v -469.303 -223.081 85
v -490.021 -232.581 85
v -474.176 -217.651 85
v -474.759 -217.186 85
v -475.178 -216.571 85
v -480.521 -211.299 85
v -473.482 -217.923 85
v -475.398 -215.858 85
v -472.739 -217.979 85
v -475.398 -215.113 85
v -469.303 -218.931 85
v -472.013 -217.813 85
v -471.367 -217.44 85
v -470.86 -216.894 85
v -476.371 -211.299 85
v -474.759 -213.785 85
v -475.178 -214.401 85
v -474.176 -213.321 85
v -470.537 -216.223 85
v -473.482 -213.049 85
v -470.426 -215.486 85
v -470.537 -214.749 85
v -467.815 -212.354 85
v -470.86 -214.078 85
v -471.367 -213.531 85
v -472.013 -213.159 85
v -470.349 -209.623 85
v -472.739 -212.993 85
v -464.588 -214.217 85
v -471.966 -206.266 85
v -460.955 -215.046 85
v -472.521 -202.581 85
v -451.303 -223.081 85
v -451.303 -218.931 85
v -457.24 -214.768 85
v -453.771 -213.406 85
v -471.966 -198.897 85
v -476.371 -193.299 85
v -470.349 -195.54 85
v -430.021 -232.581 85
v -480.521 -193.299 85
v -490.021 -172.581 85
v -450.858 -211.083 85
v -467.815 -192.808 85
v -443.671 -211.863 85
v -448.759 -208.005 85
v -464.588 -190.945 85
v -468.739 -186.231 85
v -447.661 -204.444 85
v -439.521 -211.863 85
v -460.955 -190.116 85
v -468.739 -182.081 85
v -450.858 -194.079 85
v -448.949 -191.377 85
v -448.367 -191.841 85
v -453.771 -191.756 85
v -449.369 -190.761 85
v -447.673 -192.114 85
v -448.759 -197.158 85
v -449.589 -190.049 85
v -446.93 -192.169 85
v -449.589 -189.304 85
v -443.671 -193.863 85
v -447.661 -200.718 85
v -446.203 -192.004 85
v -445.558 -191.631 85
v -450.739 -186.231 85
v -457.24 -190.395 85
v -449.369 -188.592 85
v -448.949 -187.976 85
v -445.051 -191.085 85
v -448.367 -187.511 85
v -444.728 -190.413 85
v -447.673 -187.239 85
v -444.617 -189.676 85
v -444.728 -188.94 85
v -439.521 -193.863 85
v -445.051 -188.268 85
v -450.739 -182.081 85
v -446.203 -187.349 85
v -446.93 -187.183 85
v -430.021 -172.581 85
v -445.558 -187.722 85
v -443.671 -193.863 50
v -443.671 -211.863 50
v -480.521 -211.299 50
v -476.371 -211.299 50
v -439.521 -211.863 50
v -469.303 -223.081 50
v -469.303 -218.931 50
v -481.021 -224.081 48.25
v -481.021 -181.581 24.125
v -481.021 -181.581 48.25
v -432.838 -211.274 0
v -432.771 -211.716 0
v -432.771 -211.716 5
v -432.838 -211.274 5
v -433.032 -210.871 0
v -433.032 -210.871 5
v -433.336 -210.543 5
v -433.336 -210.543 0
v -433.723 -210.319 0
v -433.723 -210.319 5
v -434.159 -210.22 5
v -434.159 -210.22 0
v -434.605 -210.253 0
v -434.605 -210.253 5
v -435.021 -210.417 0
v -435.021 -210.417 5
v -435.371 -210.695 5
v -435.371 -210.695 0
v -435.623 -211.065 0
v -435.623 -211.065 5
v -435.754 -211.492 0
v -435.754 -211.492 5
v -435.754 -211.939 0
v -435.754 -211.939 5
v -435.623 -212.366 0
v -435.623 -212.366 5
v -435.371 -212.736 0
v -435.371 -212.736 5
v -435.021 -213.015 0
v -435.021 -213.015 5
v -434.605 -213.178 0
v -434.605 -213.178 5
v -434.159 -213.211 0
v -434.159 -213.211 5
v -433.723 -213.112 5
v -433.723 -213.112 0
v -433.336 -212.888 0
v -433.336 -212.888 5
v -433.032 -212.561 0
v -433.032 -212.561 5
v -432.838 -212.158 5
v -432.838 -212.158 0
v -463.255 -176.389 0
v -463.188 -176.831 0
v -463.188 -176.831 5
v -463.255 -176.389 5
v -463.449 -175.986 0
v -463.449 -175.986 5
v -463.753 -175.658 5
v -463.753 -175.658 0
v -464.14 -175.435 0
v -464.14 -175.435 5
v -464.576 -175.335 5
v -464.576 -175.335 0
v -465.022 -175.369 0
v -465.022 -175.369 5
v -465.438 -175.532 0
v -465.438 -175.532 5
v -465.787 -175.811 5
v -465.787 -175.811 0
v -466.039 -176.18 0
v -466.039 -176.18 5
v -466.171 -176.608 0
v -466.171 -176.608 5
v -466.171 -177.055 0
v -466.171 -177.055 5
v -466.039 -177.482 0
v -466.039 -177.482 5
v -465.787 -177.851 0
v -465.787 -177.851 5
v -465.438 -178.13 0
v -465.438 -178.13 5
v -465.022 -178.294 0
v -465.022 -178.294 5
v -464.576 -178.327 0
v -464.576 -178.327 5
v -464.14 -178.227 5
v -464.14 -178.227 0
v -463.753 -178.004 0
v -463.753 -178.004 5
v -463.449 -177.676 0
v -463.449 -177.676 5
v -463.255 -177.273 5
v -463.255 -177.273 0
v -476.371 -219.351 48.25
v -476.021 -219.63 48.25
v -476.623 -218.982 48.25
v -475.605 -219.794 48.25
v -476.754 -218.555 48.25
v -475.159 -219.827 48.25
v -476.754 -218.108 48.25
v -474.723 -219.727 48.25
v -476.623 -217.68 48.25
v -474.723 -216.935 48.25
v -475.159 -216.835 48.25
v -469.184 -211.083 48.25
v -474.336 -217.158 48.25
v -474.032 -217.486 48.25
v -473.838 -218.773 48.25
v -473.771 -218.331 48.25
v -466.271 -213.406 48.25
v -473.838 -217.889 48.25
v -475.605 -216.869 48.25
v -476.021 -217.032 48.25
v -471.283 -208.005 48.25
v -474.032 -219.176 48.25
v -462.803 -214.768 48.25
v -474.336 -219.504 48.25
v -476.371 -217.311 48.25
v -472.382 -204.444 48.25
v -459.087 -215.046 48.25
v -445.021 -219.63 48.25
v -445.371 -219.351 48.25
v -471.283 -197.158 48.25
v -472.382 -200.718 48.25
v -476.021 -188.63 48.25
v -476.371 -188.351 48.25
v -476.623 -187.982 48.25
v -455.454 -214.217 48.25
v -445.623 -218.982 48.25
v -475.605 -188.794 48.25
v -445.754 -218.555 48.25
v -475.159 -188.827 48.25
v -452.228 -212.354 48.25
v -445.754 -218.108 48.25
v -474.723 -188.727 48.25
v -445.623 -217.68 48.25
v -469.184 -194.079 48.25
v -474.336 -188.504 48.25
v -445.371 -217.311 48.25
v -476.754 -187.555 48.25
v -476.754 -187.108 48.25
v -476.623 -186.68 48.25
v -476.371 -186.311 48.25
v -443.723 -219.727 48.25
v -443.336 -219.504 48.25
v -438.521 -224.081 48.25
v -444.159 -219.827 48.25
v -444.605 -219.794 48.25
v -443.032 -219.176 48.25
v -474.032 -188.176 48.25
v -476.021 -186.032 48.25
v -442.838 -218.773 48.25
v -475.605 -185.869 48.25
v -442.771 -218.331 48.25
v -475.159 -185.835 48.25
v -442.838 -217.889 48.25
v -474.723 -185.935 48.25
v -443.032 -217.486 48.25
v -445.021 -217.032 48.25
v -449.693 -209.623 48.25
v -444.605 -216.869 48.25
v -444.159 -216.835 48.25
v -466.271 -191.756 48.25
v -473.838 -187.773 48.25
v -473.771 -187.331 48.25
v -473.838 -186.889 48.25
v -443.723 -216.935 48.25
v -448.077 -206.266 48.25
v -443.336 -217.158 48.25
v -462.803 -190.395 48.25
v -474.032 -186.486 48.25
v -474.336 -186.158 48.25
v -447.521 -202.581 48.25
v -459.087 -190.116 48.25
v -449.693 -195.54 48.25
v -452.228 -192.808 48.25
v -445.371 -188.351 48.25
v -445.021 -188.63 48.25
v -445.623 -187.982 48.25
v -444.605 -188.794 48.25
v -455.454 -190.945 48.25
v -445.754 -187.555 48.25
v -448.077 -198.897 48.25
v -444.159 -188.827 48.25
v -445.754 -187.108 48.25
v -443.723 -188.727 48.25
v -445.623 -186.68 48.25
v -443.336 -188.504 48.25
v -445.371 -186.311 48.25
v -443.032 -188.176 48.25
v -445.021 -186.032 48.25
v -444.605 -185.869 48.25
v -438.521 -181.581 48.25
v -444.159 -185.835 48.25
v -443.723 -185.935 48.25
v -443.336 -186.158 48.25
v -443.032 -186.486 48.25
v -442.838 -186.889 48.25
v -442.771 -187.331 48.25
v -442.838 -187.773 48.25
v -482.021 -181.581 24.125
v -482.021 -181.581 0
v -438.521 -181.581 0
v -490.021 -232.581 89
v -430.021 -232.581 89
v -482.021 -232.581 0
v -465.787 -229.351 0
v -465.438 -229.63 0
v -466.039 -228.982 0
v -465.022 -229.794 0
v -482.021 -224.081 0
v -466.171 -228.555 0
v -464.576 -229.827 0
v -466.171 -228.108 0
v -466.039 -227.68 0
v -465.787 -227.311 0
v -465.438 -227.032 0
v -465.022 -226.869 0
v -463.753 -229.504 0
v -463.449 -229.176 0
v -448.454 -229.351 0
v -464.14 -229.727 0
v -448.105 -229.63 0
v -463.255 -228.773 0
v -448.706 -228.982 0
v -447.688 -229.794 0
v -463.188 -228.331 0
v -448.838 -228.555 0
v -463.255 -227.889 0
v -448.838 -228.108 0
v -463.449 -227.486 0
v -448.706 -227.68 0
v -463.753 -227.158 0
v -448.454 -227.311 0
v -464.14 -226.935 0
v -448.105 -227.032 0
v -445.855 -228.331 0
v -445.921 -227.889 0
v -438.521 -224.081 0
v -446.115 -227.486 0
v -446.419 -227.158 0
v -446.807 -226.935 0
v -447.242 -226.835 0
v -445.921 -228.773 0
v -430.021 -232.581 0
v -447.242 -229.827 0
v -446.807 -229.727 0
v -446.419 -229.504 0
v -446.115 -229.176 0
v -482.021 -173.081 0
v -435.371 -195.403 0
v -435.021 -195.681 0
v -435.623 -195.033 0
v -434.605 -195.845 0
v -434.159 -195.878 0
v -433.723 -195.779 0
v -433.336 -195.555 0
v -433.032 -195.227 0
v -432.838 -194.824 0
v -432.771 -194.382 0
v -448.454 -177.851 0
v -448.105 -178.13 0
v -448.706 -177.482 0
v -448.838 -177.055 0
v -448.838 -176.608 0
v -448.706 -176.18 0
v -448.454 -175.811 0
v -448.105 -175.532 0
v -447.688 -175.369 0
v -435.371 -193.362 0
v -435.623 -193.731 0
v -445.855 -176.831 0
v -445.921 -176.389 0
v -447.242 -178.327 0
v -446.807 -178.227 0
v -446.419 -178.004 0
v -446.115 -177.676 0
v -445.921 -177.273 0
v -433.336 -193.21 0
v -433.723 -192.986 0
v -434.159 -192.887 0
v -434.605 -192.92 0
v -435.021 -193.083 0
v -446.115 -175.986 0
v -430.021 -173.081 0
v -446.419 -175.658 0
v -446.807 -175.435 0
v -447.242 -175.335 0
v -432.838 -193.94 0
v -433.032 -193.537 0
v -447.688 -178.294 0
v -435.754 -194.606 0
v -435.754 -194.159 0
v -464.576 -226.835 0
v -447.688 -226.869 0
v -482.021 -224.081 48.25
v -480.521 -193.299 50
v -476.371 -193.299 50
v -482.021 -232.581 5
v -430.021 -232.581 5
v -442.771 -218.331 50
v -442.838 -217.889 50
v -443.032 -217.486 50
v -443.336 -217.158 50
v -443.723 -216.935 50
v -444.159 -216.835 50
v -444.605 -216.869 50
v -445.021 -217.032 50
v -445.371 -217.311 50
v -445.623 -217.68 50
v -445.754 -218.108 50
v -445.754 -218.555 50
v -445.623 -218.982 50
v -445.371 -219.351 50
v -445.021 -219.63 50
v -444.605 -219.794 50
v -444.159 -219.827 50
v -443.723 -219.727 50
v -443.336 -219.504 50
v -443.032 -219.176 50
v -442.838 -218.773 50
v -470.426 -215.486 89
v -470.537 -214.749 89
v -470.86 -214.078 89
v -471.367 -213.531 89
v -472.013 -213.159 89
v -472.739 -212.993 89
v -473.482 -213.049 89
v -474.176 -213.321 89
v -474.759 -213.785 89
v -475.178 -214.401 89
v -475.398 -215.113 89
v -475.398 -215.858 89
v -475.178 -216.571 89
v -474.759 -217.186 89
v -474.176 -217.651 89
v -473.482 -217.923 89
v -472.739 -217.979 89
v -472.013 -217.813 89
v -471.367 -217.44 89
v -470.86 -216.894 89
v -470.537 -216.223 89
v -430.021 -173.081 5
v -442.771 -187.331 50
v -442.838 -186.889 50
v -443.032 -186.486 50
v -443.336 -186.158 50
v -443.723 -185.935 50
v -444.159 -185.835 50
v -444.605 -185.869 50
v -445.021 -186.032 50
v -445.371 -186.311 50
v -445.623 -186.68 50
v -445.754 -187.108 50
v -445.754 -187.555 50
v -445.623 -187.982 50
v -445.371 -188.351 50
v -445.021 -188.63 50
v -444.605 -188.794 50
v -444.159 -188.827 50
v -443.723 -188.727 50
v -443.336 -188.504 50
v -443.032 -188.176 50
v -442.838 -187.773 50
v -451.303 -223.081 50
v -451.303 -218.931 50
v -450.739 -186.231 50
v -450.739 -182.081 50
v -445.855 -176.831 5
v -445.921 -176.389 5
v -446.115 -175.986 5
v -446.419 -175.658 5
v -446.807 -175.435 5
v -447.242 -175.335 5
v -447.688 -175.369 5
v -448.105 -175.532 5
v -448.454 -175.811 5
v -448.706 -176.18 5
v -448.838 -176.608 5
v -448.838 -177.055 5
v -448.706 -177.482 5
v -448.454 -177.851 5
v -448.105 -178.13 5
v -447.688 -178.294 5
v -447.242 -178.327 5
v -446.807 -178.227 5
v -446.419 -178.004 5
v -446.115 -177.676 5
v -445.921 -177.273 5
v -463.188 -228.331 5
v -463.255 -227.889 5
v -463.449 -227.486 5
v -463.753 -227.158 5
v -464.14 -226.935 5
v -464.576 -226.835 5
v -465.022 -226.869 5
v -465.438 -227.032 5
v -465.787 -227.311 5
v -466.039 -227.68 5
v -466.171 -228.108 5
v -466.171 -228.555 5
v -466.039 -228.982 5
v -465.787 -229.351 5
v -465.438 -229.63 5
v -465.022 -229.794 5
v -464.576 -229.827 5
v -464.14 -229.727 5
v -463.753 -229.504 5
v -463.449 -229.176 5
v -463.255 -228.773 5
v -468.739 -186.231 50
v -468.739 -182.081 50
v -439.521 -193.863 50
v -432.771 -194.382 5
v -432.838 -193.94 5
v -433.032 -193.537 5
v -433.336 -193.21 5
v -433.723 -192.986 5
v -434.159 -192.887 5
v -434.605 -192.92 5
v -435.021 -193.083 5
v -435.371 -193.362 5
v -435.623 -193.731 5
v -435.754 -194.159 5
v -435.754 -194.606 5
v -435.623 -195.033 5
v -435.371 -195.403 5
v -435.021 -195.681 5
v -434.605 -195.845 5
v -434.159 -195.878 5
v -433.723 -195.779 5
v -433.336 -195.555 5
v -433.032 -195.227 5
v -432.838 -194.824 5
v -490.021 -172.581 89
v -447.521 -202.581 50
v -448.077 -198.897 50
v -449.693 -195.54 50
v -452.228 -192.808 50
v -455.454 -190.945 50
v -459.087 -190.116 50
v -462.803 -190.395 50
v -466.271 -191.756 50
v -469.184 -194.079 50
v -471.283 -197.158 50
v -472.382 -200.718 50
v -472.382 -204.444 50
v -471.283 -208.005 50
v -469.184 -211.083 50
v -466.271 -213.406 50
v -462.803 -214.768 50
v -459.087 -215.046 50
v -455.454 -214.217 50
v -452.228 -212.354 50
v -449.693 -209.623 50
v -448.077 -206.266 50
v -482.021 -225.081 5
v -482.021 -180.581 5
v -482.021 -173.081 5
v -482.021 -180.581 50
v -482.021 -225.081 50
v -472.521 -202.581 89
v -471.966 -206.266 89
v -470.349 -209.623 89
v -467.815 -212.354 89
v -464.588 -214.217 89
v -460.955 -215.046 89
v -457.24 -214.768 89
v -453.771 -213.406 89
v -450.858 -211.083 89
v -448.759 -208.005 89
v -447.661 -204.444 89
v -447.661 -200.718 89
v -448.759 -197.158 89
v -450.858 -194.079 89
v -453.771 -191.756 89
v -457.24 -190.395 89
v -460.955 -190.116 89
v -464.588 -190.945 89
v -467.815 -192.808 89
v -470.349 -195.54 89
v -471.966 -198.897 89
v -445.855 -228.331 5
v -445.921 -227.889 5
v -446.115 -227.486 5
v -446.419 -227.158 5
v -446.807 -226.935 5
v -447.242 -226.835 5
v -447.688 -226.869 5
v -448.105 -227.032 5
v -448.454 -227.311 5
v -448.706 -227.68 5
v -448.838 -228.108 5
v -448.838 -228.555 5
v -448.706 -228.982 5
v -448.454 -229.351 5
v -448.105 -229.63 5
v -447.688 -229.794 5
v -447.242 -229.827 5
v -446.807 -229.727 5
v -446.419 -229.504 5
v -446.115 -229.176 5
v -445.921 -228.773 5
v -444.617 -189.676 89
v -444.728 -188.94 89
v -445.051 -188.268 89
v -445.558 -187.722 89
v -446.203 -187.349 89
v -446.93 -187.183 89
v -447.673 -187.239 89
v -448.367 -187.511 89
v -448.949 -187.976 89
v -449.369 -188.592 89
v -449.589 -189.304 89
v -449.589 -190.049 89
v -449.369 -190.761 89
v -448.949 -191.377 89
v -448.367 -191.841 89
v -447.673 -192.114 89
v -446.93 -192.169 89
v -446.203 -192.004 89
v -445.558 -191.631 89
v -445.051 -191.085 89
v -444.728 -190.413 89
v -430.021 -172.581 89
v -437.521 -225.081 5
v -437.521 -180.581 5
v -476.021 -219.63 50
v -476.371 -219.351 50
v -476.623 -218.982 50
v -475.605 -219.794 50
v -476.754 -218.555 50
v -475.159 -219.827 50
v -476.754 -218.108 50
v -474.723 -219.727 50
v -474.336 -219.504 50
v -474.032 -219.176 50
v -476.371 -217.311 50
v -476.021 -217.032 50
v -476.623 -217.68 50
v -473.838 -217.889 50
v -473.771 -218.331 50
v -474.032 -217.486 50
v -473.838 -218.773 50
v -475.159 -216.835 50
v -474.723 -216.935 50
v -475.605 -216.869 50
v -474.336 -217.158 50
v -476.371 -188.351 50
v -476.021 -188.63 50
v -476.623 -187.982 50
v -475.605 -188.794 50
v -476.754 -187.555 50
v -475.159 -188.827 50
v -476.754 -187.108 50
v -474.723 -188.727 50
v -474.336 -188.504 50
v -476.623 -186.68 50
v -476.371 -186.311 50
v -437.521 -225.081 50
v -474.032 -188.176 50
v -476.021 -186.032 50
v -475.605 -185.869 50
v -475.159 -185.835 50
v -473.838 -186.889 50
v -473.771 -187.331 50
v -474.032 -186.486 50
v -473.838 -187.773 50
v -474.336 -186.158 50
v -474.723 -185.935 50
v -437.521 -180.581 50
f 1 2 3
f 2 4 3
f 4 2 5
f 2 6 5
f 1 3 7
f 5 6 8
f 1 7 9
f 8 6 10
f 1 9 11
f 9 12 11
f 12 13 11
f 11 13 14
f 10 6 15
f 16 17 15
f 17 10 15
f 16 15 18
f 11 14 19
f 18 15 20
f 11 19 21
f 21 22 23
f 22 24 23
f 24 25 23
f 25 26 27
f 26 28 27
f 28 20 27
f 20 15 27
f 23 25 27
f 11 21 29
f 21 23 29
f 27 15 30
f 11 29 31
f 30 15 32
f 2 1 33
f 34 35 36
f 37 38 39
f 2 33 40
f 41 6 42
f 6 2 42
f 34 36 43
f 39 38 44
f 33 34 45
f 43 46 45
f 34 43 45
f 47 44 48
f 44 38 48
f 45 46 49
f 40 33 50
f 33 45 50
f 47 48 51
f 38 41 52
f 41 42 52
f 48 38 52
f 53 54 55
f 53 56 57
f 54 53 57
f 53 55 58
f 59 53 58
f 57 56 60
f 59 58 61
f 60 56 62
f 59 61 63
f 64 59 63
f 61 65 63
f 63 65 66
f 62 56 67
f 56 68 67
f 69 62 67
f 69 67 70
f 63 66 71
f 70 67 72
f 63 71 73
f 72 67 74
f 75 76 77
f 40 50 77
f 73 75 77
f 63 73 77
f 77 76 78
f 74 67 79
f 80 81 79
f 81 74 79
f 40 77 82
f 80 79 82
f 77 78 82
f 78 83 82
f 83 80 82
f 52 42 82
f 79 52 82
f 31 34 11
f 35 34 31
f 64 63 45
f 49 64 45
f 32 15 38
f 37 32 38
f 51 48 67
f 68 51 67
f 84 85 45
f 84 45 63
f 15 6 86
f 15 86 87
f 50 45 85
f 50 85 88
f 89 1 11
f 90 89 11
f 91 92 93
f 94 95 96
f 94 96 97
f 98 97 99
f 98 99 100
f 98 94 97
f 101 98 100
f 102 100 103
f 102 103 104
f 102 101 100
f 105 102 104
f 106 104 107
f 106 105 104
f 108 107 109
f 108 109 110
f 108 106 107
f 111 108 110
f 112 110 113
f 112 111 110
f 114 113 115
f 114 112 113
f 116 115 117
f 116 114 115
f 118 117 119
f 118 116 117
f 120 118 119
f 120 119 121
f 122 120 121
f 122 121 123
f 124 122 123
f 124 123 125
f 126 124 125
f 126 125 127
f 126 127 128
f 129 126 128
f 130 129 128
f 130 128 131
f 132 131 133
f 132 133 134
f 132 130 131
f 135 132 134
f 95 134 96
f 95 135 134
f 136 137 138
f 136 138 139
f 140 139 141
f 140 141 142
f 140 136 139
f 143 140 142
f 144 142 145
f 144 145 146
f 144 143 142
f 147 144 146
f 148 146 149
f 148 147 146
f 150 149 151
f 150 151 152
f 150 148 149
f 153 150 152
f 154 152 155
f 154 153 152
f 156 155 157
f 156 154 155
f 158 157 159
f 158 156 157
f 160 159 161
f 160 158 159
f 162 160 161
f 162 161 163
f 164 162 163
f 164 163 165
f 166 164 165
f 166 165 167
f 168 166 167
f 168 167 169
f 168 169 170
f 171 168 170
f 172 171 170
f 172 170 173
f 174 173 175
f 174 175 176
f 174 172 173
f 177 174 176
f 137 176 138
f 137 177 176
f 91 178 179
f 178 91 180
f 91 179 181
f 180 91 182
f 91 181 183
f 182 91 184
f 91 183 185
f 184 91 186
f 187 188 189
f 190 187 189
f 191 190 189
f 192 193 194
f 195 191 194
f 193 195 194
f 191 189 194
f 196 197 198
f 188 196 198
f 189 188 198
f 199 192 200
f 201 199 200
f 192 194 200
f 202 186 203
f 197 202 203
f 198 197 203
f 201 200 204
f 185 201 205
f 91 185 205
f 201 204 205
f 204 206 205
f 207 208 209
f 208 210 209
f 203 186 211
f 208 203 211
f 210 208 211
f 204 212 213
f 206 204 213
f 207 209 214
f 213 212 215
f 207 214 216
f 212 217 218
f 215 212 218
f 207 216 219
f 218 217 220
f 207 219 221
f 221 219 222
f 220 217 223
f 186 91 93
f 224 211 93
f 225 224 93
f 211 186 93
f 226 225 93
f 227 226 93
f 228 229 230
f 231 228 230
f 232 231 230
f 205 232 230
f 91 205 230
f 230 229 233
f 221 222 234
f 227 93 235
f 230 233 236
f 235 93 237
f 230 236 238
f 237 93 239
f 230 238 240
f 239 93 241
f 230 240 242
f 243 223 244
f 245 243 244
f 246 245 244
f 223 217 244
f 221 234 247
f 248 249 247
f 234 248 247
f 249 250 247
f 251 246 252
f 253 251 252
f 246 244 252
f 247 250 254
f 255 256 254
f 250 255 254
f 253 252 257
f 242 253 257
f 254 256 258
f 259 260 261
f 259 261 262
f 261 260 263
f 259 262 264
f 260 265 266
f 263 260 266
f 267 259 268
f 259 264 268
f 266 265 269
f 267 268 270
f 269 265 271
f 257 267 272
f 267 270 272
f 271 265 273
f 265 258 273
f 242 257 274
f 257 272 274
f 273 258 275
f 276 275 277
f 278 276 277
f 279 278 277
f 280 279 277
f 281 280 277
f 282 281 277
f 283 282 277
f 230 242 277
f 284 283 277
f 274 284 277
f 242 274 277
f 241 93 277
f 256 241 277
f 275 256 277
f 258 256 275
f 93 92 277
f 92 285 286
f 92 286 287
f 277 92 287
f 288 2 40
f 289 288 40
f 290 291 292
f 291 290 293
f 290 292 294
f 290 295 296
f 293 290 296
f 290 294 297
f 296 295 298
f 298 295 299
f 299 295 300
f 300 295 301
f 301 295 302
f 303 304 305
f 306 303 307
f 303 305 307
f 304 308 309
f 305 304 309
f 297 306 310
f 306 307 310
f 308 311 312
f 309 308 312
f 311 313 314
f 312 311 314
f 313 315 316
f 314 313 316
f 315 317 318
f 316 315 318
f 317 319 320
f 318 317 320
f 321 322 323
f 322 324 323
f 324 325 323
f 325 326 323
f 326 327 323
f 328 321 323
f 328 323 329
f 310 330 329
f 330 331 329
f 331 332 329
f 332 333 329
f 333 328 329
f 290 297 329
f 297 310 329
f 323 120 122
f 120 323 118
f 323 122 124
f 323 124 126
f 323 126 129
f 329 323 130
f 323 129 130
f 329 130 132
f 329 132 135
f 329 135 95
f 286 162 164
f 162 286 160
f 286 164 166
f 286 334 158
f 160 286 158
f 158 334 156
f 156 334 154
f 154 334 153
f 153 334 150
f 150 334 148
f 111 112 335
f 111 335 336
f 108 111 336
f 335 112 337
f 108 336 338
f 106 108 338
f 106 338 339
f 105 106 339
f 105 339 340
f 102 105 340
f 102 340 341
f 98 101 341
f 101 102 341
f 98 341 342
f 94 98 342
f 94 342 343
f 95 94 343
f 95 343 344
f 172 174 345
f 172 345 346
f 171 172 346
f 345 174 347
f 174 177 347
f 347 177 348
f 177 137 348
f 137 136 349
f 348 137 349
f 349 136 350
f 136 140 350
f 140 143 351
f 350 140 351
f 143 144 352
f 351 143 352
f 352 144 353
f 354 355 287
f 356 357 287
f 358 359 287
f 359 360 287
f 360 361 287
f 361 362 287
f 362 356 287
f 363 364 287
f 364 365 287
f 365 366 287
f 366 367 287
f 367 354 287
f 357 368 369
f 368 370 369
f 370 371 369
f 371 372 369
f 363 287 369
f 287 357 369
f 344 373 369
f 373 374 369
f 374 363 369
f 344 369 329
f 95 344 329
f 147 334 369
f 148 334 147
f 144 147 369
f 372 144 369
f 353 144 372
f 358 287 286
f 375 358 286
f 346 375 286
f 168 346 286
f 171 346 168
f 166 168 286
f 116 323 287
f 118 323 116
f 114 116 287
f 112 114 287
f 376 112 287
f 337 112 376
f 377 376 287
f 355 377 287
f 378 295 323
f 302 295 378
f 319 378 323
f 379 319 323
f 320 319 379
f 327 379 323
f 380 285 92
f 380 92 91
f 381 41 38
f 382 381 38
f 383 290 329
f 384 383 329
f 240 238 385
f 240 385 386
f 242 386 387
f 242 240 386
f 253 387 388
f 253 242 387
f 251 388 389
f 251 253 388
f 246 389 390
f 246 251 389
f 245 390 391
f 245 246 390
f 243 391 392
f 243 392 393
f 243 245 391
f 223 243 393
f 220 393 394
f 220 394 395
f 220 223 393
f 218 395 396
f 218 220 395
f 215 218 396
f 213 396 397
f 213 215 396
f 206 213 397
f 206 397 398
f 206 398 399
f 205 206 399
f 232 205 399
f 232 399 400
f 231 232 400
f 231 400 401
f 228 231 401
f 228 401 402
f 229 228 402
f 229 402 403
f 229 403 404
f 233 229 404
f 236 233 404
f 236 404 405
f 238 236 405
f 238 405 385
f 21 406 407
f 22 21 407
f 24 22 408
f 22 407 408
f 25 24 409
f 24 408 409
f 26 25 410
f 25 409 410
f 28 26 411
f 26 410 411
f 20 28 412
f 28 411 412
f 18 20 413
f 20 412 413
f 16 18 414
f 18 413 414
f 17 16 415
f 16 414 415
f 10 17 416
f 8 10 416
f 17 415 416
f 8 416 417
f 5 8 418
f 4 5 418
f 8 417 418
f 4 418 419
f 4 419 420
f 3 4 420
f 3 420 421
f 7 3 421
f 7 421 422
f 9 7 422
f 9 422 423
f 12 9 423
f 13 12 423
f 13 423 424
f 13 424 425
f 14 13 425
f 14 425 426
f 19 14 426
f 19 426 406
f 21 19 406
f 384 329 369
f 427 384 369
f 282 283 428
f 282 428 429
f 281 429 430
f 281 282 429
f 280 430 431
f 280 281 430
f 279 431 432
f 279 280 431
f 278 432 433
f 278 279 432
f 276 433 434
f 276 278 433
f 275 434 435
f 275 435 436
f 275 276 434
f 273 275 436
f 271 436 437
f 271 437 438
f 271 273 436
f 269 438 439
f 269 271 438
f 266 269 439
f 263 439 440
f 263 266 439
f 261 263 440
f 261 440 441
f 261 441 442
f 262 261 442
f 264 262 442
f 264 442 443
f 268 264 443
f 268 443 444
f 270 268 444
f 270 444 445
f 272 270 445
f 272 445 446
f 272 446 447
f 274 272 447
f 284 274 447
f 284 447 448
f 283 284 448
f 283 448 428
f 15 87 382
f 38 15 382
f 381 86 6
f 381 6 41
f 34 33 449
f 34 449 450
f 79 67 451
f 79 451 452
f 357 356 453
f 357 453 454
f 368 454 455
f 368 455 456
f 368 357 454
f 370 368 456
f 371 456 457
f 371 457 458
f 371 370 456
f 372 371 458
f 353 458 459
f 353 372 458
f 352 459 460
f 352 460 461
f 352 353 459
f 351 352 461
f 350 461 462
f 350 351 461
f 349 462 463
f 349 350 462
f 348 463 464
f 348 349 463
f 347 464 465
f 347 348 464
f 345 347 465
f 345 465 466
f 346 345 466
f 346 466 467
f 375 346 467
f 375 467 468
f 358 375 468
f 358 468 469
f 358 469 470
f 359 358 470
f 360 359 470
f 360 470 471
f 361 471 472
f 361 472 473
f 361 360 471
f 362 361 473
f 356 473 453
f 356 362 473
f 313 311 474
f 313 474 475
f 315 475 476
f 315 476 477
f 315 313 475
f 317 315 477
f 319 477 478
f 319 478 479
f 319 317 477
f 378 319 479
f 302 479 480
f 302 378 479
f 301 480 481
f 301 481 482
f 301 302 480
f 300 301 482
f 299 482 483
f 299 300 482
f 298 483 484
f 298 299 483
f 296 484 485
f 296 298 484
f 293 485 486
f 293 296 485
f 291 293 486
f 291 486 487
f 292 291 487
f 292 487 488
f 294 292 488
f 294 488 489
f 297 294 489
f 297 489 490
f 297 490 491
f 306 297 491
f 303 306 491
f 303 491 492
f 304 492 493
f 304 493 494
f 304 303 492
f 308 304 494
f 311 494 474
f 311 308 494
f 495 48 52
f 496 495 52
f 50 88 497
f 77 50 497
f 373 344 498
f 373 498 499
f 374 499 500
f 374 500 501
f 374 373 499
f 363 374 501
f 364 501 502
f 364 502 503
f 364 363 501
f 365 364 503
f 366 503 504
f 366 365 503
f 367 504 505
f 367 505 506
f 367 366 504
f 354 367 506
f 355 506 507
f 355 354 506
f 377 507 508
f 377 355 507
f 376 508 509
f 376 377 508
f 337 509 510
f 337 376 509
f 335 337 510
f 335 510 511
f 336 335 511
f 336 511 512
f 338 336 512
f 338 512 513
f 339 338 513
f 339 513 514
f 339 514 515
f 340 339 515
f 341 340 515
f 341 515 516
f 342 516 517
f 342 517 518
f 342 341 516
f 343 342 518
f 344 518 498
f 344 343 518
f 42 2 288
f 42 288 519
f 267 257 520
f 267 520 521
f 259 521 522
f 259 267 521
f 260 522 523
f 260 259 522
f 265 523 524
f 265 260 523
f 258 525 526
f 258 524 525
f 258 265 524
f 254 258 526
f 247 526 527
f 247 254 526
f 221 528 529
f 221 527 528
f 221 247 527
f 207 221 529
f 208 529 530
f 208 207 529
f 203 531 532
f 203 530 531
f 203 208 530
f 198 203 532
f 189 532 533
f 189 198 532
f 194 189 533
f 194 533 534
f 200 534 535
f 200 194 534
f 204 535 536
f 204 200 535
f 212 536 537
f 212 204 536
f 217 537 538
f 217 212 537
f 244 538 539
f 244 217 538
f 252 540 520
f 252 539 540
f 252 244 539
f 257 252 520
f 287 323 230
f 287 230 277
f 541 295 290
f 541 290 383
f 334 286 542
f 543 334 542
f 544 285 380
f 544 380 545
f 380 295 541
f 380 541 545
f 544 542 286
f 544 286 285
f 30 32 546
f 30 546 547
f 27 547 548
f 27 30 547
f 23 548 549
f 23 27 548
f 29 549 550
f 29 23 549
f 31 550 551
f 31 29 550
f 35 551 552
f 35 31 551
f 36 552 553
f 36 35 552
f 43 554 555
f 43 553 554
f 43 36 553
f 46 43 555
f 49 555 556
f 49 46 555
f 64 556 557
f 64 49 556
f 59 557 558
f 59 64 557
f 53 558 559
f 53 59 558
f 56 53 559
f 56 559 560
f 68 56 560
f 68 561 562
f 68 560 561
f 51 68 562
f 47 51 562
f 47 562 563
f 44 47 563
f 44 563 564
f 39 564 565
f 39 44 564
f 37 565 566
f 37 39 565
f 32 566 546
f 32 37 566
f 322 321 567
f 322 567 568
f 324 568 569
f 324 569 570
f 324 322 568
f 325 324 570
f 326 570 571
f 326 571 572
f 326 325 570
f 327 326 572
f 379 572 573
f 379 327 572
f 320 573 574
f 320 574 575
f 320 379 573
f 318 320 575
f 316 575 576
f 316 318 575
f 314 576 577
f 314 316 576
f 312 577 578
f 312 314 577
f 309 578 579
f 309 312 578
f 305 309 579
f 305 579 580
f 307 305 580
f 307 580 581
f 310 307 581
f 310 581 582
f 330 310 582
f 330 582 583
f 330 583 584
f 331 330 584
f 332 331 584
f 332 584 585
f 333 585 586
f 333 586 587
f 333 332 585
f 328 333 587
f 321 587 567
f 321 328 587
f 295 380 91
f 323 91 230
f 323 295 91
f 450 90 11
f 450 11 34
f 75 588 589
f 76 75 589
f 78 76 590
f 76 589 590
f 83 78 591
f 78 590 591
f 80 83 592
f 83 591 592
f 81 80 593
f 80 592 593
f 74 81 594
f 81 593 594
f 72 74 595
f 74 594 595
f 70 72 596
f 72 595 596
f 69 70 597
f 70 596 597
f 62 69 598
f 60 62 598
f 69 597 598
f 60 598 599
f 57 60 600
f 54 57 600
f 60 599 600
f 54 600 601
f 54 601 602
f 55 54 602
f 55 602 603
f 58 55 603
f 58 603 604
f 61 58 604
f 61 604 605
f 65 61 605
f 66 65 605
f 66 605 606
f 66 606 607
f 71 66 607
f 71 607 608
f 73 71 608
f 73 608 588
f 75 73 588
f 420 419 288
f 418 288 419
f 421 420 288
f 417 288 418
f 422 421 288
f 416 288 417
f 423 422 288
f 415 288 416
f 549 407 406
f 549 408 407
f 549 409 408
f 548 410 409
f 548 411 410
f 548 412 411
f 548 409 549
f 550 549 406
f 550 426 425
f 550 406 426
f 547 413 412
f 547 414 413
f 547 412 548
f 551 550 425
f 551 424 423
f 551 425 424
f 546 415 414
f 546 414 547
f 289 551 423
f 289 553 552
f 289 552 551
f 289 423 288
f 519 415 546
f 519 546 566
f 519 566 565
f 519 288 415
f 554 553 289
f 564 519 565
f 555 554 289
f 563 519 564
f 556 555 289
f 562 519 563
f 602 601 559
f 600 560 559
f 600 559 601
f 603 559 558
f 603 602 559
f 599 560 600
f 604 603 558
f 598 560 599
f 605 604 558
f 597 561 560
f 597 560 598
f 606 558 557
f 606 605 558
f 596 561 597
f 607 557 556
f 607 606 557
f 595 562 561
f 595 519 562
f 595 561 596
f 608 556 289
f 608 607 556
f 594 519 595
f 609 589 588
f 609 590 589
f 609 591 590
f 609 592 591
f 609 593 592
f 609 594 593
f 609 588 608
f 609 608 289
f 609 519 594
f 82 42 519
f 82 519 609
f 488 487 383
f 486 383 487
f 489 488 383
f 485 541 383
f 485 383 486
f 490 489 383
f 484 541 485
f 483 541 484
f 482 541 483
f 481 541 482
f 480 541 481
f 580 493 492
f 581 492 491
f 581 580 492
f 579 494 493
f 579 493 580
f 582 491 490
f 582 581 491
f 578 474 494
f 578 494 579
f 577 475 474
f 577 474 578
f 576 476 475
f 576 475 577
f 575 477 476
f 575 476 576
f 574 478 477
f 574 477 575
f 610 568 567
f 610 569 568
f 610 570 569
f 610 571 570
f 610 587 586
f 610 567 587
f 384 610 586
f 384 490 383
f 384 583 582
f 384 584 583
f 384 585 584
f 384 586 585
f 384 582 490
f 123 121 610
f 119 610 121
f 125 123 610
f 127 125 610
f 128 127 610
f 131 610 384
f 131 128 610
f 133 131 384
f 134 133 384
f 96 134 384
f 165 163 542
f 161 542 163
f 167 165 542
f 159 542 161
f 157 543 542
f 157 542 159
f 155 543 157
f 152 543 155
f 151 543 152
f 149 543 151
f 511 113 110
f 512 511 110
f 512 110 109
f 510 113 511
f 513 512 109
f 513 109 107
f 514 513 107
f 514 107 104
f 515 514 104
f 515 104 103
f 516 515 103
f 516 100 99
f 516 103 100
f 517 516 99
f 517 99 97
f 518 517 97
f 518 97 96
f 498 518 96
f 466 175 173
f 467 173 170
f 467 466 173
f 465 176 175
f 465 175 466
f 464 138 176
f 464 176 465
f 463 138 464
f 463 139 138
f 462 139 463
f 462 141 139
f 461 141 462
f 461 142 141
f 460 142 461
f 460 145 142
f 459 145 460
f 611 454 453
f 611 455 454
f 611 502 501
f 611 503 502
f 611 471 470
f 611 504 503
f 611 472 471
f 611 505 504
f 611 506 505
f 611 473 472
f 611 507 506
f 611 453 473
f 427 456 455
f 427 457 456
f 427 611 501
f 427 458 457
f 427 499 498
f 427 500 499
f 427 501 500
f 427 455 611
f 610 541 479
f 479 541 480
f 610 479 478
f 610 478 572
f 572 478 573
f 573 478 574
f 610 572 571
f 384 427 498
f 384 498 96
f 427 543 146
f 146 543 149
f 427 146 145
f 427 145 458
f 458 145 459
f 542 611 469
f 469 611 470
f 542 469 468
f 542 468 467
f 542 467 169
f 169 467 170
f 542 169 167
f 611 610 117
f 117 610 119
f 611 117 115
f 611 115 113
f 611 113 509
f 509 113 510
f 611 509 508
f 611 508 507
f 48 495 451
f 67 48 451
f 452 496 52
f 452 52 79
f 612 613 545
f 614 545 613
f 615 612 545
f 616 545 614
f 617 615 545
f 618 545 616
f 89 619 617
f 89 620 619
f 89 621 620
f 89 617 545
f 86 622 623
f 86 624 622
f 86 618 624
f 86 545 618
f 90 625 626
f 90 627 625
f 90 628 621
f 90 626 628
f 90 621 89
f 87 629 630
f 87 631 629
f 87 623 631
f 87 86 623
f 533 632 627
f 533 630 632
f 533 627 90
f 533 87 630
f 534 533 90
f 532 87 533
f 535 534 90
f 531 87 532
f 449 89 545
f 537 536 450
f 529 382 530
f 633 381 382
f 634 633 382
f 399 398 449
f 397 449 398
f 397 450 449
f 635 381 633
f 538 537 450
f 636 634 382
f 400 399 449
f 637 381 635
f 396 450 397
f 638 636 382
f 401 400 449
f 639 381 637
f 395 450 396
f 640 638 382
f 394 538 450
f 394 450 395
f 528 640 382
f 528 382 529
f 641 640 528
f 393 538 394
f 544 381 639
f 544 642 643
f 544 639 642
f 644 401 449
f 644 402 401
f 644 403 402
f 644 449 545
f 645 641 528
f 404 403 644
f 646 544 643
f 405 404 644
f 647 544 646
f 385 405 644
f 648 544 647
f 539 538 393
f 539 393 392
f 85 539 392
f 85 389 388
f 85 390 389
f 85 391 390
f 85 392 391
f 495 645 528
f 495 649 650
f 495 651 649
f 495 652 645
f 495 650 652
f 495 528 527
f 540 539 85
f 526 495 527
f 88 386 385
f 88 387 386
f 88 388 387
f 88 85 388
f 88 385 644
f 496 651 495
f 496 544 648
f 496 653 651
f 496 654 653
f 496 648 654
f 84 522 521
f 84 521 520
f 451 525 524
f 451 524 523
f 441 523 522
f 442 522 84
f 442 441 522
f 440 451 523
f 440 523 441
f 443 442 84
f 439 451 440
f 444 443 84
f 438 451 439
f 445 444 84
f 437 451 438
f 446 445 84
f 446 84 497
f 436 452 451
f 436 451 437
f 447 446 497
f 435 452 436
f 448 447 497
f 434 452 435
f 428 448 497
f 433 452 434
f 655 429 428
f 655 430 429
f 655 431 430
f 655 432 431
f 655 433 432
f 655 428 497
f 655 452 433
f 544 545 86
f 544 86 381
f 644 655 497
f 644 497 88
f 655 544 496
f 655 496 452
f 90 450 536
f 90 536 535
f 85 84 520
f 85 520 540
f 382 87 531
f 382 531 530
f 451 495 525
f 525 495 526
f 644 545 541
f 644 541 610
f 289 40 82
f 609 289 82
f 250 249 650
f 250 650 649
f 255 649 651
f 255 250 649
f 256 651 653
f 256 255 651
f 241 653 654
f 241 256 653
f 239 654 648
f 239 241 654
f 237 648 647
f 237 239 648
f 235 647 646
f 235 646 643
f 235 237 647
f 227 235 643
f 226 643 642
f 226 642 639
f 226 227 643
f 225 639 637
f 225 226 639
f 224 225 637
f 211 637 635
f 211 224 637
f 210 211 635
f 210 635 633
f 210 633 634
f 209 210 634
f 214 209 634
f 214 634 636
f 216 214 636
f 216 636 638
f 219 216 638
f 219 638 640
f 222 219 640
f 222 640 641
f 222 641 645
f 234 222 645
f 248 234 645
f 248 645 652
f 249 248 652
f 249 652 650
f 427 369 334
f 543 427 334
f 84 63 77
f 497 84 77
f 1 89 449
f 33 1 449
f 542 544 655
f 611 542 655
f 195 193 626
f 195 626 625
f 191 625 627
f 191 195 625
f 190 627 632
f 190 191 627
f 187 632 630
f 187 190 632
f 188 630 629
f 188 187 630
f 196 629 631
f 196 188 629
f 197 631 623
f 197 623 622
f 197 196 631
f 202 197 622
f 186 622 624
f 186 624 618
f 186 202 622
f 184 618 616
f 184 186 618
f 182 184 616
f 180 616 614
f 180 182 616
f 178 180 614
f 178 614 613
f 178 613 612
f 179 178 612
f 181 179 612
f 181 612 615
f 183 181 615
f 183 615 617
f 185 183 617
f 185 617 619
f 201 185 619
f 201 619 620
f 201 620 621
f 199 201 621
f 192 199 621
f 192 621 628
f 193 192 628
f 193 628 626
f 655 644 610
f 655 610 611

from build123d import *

# Parameters (mm, degrees)
SKETCH6_R           = 1.5
BOSS_EXTRUDE4_DEPTH = 5
SKETCH8_W           = 44.5
SKETCH8_H           = 44.5
SKETCH8_R           = 1.5
SKETCH8_R_2         = 12.5
BOSS_EXTRUDE5_DEPTH = 50
SKETCH7_W           = 43.5
SKETCH7_H           = 42.5
CUT_EXTRUDE4_DEPTH  = 48.25
BOSS_EXTRUDE6_DEPTH = 1
SKETCH11_W          = 18
SKETCH11_H          = 4.15
SKETCH11_W_2        = 4.15
SKETCH11_H_2        = 18
BOSS_EXTRUDE7_DEPTH = 35
SKETCH14_W          = 60
SKETCH14_H          = 60
BOSS_EXTRUDE8_DEPTH = 4
CUT_EXTRUDE5_REACH  = 551.669
SKETCH16_R          = 2.5
SKETCH17_R          = 12.5
CUT_EXTRUDE6_DEPTH  = 550.668785806


with BuildPart() as part:
    # Sketch6 → Boss-Extrude4 (new body)
    with BuildSketch(Plane.XY):
        Polygon((-437.521213625, -225.081134847), (-482.021213625, -225.081134847), (-482.021213625, -232.581134847), (-430.021213625, -232.581134847), (-430.021213625, -173.081134847), (-482.021213625, -173.081134847), (-482.021213625, -180.581134847), (-437.521213625, -180.581134847), align=None)
        with Locations((-464.687880625, -228.331134847)):
            Circle(SKETCH6_R, mode=Mode.SUBTRACT)
        with Locations((-447.354547625, -228.331134847)):
            Circle(SKETCH6_R, mode=Mode.SUBTRACT)
        with Locations((-434.271213625, -211.715651861)):
            Circle(SKETCH6_R, mode=Mode.SUBTRACT)
        with Locations((-464.687883625, -176.831134847)):
            Circle(SKETCH6_R, mode=Mode.SUBTRACT)
        with Locations((-434.271213625, -194.382318861)):
            Circle(SKETCH6_R, mode=Mode.SUBTRACT)
        with Locations((-447.354550625, -176.831134847)):
            Circle(SKETCH6_R, mode=Mode.SUBTRACT)
    extrude(amount=BOSS_EXTRUDE4_DEPTH)

    # Sketch8 → Boss-Extrude5 (add)
    with BuildSketch(Plane.XY):
        with Locations((-459.771213625, -202.831134847)):
            Rectangle(SKETCH8_W, SKETCH8_H)
        with Locations((-475.271213625, -218.331134847)):
            Circle(SKETCH8_R, mode=Mode.SUBTRACT)
        with Locations((-444.271213625, -218.331134847)):
            Circle(SKETCH8_R, mode=Mode.SUBTRACT)
        with Locations((-444.271213625, -187.331134847)):
            Circle(SKETCH8_R, mode=Mode.SUBTRACT)
        with Locations((-475.271213625, -187.331134847)):
            Circle(SKETCH8_R, mode=Mode.SUBTRACT)
        with Locations((-460.021213625, -202.581134847)):
            Circle(SKETCH8_R_2, mode=Mode.SUBTRACT)
    extrude(amount=BOSS_EXTRUDE5_DEPTH)

    # Sketch7 → Cut-Extrude4 (cut)
    with BuildSketch(Plane.XY):
        with Locations((-460.271213625, -202.831134847)):
            Rectangle(SKETCH7_W, SKETCH7_H)
    extrude(amount=CUT_EXTRUDE4_DEPTH, mode=Mode.SUBTRACT)

    # Sketch10 → Boss-Extrude6 (add)
    with BuildSketch(Plane.ZY.offset(482.021213625)):
        Polygon((24.125, -181.581134847), (48.25, -224.081134847), (48.25, -181.581134847), align=None)
    extrude(amount=-BOSS_EXTRUDE6_DEPTH)

    # Sketch11 → Boss-Extrude7 (add)
    with BuildSketch(Plane.XY.offset(50)):
        with Locations((-460.303059696, -221.006134847)):
            Rectangle(SKETCH11_W, SKETCH11_H)
        with Locations((-441.596213625, -202.862980918)):
            Rectangle(SKETCH11_W_2, SKETCH11_H_2)
        with Locations((-478.446213625, -202.299288776)):
            Rectangle(SKETCH11_W_2, SKETCH11_H_2)
        with Locations((-459.739367554, -184.156134847)):
            Rectangle(SKETCH11_W, SKETCH11_H)
    extrude(amount=BOSS_EXTRUDE7_DEPTH)

    # Sketch14 → Boss-Extrude8 (add)
    with BuildSketch(Plane.XY.offset(85)):
        with Locations((-460.021213625, -202.581134847)):
            Rectangle(SKETCH14_W, SKETCH14_H)
    extrude(amount=BOSS_EXTRUDE8_DEPTH)

    # Sketch16 → Cut-Extrude5 (cut, up to next)
    with BuildSketch(Plane.XY.offset(89), mode=Mode.PRIVATE) as cut_extrude5_sk1:
        with Locations((-447.116514868, -189.67643609)):
            Circle(SKETCH16_R)
    cut_extrude5_tool1 = extrude(cut_extrude5_sk1.sketch, amount=-CUT_EXTRUDE5_REACH, mode=Mode.PRIVATE) & part.part
    # Sketch16 → Cut-Extrude5 (cut, up to next)
    with BuildSketch(Plane.XY.offset(89), mode=Mode.PRIVATE) as cut_extrude5_sk2:
        with Locations((-472.925912382, -215.485833604)):
            Circle(SKETCH16_R)
    cut_extrude5_tool2 = extrude(cut_extrude5_sk2.sketch, amount=-CUT_EXTRUDE5_REACH, mode=Mode.PRIVATE) & part.part
    add(cut_extrude5_tool1.solids().sort_by_distance((-447.116515, -189.676436, 89))[0], mode=Mode.SUBTRACT)
    add(cut_extrude5_tool2.solids().sort_by_distance((-472.925912, -215.485834, 89))[0], mode=Mode.SUBTRACT)

    # Sketch17 → Cut-Extrude6 (cut, through all)
    with BuildSketch(Plane.XY):
        with Locations(Location((-460.021213625, -202.581134847, 0), (0, 0, 180))):
            Circle(SKETCH17_R)
    extrude(amount=CUT_EXTRUDE6_DEPTH, mode=Mode.SUBTRACT)


solid = part.part
